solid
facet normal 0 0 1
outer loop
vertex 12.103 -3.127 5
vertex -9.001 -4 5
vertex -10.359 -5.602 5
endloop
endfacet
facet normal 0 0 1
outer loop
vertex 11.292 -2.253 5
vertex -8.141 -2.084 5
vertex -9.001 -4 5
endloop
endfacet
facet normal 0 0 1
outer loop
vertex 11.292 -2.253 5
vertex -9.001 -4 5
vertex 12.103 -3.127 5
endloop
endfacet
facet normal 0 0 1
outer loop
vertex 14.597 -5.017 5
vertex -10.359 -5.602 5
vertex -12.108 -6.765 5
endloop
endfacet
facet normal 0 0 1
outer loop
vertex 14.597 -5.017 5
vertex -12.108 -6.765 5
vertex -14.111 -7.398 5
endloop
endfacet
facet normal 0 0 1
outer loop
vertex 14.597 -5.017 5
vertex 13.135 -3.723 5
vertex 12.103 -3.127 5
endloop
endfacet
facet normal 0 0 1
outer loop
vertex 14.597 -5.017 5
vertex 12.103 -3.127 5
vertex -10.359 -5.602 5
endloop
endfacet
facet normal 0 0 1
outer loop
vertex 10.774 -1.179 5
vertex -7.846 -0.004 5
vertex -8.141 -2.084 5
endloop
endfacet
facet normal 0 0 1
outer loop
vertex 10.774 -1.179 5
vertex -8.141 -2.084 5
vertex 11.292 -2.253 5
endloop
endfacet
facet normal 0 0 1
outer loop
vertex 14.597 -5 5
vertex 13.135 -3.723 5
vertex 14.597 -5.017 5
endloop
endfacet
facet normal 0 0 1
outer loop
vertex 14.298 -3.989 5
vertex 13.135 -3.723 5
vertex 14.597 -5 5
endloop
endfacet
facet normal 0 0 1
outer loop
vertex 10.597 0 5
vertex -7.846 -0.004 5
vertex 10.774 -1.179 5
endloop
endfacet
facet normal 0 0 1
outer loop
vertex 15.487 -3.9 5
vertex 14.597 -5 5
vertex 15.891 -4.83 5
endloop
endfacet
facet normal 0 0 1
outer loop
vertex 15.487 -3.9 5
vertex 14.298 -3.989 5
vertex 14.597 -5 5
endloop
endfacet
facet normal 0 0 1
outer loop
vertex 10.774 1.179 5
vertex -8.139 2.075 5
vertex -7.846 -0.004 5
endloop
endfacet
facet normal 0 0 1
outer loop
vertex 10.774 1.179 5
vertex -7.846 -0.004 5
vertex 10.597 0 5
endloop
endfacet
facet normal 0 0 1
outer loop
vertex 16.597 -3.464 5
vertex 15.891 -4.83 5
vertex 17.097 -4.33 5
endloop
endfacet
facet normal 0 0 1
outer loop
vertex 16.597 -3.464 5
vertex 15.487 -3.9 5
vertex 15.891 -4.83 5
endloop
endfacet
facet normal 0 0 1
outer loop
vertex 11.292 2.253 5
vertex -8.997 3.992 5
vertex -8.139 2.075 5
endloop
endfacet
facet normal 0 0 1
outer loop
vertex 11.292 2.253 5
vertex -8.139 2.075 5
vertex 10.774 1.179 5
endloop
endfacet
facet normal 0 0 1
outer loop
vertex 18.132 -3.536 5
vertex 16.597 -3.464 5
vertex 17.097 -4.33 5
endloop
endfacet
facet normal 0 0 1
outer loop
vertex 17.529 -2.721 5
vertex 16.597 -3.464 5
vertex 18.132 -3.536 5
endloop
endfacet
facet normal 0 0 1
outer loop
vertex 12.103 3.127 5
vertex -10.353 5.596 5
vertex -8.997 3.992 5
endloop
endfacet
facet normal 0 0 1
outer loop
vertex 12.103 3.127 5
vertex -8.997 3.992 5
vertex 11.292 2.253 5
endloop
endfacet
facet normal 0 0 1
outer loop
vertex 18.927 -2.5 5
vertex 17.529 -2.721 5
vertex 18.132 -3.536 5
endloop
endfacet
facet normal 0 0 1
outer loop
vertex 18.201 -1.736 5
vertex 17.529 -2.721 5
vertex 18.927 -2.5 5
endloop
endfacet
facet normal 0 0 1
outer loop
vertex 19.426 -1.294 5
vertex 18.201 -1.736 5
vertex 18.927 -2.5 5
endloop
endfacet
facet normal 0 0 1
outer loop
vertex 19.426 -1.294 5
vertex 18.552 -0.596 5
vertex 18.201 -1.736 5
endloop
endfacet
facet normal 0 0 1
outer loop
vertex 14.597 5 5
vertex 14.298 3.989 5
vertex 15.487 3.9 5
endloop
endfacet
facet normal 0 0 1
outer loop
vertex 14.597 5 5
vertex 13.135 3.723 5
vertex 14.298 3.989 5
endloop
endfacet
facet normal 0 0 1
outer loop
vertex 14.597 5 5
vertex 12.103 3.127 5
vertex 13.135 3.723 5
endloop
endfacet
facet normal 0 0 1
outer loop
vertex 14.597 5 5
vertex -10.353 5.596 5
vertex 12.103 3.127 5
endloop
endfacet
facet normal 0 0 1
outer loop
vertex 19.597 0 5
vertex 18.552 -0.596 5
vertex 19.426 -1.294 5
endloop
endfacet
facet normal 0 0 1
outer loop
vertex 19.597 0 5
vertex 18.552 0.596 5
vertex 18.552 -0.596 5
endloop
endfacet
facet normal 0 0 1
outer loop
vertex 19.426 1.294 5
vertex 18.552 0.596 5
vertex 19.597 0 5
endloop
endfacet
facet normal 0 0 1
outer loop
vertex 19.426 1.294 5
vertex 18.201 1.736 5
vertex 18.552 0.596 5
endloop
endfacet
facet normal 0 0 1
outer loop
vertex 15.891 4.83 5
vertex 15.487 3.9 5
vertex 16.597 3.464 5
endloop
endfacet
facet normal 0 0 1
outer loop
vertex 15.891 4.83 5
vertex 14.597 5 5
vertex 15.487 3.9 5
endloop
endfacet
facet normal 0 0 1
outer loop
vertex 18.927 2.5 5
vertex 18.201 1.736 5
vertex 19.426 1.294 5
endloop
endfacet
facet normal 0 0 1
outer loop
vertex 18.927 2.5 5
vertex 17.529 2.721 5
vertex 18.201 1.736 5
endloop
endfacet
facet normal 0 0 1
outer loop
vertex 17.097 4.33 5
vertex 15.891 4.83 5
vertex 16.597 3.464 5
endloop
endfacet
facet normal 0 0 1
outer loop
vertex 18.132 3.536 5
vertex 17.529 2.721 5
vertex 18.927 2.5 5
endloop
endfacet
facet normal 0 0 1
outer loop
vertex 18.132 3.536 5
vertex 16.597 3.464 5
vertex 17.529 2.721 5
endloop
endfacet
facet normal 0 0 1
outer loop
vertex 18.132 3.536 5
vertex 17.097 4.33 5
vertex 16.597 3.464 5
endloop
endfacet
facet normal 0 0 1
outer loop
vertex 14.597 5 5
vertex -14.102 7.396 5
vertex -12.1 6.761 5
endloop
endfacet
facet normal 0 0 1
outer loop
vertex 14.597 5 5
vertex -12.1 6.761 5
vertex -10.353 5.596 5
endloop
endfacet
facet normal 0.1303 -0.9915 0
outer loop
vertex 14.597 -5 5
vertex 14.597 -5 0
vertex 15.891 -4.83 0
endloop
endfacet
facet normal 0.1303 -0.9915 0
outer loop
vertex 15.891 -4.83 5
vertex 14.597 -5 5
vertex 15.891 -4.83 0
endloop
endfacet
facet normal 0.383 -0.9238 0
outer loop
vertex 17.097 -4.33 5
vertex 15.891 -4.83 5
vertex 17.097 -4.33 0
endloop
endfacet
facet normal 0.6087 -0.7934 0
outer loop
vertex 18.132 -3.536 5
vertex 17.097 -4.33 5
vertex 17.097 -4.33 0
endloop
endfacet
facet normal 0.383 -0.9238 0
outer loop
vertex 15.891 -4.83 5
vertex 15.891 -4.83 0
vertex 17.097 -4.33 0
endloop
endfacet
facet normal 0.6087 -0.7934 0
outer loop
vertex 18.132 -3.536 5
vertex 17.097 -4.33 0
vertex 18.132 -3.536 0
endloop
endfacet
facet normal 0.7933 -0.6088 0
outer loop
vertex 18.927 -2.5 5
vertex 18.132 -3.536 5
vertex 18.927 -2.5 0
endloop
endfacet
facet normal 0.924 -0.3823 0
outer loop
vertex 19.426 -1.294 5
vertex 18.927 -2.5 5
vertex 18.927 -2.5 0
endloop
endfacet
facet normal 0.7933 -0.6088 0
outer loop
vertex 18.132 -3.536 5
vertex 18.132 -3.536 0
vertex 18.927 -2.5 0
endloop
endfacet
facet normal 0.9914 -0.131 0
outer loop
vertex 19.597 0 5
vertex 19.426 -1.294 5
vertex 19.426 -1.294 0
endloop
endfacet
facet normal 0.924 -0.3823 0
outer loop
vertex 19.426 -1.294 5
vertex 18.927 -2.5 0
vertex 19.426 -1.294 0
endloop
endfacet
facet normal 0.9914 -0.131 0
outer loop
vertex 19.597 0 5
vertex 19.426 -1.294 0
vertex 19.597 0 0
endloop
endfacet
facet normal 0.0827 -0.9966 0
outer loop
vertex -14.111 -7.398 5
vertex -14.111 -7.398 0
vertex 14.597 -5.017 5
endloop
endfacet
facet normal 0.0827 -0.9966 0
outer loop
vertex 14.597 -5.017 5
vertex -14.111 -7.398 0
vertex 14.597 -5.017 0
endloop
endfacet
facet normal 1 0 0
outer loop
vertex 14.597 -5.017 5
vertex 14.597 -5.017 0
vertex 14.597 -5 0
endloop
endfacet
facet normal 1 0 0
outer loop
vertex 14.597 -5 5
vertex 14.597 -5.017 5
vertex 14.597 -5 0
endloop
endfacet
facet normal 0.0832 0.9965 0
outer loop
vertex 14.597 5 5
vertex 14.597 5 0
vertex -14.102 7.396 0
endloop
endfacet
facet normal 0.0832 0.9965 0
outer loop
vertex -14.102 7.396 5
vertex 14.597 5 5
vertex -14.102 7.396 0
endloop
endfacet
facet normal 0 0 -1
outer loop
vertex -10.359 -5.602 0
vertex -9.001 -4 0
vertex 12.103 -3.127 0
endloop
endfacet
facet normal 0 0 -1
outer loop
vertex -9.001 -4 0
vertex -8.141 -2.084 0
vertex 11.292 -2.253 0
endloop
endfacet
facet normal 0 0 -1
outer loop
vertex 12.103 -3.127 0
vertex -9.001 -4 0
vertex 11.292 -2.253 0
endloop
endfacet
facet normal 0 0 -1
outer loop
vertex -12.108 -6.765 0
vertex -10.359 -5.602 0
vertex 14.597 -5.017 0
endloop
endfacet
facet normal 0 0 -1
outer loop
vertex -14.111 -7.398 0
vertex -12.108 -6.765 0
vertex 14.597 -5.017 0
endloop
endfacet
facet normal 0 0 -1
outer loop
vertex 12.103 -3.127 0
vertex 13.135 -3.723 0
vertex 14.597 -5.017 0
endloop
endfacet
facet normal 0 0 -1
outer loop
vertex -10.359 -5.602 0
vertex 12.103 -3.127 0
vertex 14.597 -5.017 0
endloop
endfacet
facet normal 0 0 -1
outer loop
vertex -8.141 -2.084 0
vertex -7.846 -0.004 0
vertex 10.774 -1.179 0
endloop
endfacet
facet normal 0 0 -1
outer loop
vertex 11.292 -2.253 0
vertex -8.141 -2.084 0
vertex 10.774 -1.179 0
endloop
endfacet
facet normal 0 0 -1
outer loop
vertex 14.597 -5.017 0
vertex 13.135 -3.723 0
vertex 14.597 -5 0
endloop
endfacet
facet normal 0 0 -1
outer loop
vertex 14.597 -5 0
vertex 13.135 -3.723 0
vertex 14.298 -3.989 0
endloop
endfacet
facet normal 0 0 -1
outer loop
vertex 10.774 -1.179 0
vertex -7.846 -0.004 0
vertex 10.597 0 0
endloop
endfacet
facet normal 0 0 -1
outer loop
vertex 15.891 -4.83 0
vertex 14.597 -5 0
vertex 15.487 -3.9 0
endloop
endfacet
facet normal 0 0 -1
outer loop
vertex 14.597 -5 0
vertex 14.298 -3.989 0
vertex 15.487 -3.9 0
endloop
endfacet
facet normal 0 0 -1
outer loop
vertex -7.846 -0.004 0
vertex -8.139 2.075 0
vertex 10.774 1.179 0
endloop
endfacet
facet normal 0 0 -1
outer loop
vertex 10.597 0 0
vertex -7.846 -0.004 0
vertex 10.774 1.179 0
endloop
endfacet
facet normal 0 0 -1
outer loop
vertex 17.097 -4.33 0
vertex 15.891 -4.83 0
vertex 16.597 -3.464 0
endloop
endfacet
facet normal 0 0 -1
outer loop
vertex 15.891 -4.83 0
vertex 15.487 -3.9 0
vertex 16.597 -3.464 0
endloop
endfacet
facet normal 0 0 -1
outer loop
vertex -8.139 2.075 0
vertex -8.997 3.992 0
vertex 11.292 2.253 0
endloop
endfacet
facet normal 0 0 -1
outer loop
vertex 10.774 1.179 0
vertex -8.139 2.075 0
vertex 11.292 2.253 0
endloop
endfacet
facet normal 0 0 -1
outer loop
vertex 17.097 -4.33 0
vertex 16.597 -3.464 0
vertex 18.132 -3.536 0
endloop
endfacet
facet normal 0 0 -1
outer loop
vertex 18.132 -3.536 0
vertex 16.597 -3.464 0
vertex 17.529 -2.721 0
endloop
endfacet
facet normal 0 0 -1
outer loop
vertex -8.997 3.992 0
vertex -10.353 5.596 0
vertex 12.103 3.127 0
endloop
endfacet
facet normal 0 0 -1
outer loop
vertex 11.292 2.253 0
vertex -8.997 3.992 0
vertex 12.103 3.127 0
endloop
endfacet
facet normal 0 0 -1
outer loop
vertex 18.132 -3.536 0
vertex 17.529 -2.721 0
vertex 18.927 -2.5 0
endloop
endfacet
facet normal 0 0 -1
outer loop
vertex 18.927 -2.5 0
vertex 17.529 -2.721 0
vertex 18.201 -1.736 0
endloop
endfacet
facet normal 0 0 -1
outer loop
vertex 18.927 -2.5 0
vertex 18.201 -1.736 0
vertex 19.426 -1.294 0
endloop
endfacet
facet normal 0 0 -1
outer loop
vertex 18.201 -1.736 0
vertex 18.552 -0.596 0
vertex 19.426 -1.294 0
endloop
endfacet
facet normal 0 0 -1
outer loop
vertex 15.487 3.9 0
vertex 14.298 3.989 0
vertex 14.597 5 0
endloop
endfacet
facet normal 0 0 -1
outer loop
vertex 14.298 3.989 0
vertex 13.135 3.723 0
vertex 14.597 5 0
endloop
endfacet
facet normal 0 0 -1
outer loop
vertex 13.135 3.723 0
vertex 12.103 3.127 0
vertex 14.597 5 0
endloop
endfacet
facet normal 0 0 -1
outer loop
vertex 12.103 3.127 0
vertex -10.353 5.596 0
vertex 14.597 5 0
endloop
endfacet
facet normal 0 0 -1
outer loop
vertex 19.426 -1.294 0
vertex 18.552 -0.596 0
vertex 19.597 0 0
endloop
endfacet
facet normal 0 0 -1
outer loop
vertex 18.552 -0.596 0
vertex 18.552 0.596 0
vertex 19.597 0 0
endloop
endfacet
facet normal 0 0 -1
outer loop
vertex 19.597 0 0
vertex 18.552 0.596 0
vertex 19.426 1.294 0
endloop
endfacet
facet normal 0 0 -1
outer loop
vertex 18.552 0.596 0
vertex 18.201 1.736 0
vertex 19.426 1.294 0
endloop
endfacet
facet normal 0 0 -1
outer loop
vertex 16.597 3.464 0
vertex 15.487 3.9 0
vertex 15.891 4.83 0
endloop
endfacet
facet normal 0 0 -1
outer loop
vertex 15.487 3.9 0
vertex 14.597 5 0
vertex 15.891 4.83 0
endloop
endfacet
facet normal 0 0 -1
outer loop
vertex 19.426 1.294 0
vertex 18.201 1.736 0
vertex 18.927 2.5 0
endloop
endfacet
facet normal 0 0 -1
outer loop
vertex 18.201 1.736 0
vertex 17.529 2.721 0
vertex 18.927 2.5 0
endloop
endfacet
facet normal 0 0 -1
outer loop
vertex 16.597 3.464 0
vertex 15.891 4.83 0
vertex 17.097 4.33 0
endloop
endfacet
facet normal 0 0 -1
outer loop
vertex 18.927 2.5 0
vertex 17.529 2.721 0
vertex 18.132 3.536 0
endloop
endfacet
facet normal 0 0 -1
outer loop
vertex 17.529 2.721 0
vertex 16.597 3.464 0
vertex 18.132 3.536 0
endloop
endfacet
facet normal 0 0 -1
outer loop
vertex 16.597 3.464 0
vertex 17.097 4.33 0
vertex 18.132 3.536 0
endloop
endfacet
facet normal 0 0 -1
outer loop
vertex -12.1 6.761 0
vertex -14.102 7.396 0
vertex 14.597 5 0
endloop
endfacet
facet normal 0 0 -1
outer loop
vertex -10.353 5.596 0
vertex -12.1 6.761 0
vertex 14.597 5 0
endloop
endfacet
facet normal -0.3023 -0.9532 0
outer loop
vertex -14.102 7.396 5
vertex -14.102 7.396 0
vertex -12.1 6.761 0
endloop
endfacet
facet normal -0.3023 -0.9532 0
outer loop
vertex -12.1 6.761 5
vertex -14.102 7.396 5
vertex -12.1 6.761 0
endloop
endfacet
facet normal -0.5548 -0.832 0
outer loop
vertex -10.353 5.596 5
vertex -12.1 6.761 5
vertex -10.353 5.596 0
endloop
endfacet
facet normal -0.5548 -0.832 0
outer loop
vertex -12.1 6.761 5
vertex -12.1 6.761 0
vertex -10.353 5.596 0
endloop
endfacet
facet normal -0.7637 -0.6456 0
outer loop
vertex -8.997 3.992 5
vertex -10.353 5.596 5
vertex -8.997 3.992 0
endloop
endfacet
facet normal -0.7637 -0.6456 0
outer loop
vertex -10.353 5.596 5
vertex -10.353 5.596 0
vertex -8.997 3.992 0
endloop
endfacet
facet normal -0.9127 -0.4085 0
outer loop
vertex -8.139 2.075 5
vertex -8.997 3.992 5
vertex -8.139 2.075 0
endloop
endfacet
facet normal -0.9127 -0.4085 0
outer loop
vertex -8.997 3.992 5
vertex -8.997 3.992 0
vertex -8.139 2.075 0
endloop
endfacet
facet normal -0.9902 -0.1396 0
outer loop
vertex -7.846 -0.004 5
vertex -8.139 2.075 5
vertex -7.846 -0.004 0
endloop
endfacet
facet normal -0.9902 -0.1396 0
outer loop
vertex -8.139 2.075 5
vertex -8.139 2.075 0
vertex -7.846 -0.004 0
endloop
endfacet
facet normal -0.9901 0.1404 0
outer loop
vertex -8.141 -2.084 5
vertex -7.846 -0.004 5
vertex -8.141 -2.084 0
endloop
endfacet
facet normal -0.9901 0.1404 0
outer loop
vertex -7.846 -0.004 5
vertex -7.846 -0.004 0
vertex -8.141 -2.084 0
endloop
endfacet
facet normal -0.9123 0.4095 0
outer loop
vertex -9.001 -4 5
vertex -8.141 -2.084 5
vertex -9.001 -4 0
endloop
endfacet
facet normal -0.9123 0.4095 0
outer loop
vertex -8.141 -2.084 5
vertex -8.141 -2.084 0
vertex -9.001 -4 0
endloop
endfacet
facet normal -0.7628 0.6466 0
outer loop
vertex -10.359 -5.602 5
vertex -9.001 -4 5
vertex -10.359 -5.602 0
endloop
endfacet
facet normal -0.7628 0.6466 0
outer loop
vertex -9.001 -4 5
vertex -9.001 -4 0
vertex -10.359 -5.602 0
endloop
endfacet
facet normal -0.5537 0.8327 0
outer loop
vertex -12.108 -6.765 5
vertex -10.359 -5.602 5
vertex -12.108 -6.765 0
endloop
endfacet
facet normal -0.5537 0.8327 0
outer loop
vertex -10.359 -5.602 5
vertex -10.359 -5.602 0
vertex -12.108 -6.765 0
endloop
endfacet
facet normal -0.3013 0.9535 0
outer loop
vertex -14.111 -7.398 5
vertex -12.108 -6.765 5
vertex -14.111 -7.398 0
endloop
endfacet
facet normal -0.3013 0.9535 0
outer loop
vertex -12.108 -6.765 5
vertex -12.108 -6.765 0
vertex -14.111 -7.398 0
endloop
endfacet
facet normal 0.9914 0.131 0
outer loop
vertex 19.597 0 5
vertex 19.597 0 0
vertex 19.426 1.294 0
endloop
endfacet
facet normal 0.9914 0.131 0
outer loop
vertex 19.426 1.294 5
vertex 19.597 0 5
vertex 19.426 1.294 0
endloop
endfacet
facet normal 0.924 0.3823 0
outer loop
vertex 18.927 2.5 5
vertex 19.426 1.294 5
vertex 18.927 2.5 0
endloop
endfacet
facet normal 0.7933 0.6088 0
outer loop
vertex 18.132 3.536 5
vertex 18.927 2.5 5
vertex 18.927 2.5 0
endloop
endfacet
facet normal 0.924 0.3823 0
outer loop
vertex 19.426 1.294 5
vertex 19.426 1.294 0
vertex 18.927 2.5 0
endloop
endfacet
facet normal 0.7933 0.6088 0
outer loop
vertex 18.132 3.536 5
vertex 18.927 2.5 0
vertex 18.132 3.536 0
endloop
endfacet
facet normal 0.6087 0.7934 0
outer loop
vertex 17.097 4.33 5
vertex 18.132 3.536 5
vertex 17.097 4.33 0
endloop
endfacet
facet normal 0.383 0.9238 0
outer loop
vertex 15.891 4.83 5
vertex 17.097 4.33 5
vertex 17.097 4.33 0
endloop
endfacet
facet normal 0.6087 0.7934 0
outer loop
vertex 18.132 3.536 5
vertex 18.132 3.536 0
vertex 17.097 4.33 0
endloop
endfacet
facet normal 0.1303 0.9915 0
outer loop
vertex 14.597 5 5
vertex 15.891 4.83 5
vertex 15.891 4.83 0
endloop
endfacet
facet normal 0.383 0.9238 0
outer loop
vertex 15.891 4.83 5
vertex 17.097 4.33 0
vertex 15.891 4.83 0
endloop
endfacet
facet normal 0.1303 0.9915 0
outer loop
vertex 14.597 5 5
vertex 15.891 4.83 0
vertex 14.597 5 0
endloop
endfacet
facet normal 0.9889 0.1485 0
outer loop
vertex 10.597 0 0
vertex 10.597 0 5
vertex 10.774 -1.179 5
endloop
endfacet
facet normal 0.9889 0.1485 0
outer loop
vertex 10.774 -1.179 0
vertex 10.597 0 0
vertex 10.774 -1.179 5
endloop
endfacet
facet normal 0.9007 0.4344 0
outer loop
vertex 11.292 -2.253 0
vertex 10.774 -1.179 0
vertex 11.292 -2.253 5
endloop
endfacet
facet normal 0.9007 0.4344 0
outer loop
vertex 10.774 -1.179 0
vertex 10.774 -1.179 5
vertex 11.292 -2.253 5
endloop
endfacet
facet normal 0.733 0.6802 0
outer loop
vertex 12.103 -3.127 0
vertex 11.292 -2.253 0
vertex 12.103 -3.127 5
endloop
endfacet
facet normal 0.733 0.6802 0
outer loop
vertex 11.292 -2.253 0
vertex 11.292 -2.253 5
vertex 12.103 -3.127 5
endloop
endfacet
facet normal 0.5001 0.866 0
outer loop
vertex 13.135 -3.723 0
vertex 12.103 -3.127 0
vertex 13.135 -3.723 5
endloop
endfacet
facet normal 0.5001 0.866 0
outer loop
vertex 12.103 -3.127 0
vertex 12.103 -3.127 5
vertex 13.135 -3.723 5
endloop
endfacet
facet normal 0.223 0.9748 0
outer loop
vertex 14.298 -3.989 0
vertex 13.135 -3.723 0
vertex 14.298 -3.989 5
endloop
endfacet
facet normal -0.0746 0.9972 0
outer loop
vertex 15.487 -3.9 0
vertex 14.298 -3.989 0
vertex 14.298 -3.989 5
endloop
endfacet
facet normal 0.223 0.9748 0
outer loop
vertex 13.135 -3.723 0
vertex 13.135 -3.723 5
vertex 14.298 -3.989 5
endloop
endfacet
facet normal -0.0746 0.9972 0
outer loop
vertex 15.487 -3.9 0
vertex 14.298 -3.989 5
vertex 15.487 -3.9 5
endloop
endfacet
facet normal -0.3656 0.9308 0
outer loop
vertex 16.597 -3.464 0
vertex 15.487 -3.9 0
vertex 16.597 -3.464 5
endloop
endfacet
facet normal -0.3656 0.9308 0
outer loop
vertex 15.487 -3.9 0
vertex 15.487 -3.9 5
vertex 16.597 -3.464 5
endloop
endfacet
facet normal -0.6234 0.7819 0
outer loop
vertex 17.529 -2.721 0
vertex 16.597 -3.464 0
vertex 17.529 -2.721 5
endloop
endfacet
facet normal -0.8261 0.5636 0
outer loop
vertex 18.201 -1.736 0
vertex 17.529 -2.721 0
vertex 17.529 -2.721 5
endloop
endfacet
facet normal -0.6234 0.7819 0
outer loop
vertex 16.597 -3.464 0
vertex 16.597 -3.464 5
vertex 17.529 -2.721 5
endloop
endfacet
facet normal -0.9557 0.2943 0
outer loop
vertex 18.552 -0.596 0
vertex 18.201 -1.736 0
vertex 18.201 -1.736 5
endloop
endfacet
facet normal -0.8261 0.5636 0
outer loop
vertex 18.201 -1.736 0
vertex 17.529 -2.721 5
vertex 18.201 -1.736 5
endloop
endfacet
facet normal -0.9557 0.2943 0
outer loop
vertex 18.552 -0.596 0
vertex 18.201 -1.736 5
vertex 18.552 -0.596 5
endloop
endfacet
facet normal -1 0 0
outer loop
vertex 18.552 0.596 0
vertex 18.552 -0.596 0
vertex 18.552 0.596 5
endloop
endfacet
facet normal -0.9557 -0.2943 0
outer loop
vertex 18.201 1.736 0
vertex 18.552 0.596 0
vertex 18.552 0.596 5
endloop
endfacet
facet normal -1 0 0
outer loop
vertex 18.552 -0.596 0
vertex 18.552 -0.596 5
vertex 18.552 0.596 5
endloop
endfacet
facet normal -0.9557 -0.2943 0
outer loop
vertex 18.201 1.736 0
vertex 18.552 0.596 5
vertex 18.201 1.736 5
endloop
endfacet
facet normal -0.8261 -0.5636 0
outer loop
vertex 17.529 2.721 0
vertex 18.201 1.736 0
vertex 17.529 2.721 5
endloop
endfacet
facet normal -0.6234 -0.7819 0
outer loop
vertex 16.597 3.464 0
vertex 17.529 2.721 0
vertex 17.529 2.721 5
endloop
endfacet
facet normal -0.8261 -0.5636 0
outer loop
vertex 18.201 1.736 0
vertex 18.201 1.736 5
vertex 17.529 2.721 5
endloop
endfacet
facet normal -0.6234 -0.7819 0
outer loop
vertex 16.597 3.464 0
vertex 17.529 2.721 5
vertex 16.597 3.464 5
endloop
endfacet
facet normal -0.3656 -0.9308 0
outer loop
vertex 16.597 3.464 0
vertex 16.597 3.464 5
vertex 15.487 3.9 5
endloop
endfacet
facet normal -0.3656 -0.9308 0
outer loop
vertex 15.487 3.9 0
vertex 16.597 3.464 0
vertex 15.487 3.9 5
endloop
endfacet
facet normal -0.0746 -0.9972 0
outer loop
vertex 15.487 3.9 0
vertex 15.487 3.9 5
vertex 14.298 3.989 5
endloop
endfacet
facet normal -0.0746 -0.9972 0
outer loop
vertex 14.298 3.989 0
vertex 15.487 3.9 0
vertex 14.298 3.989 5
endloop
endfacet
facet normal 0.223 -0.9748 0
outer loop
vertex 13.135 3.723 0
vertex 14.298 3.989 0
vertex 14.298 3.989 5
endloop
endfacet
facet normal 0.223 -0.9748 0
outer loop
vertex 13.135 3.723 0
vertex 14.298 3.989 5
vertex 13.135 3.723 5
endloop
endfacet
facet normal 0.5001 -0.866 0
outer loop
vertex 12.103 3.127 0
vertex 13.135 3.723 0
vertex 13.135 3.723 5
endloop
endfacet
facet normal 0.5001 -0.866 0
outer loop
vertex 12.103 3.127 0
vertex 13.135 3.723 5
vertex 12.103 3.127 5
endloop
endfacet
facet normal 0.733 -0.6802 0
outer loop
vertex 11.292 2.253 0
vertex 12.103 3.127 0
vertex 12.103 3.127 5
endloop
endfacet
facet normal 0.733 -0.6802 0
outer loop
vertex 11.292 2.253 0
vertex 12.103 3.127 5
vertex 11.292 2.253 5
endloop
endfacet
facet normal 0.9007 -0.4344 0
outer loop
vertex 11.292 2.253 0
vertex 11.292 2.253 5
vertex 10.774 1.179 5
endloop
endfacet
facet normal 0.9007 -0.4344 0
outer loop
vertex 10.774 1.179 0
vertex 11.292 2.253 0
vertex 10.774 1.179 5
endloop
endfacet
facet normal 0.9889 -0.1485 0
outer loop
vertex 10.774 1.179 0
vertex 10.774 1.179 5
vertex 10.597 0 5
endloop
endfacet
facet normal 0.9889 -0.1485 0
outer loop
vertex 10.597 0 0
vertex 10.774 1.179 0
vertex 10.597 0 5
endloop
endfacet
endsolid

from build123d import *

# Parameters (mm, degrees)
F1_DEPTH = 5
F3_D     = 8


with BuildPart() as f1:
    # F0 (on Top) → F1 (new body)
    with BuildSketch(Plane.XY):
        with BuildLine():
            ThreePointArc((14.5967810947, -5), (18.1323150007, -3.5355339059), (19.5967810947, 0))
            ThreePointArc((19.5967810947, 0), (18.1323150007, 3.5355339059), (14.5967810947, 5))
            Line((14.5967810947, 5), (14.5967810947, 0))
            Line((14.5967810947, 0), (14.5967810947, -5))
        make_face()
        with BuildLine():
            Line((14.5967810947, 0), (14.5967810947, 5))
            ThreePointArc((14.5967810947, 5), (9.5967810947, 0), (14.5967810947, -5))
            Line((14.5967810947, -5), (14.5967810947, 0))
        make_face()
        with BuildLine():
            ThreePointArc((14.5967810947, -5), (9.5967810947, 0), (14.5967810947, 5))
            Line((14.5967810947, 5), (-14.1023044895, 7.3961588722))
            ThreePointArc((-14.1023044895, 7.3961588722), (-9.6198593647, 4.8436616619), (-7.8460222776, 0))
            ThreePointArc((-7.8460222776, 0), (-9.6226170145, -4.8469198667), (-14.110724196, -7.39756978))
            Line((-14.110724196, -7.39756978), (14.5967810947, -5.0171596368))
            Line((14.5967810947, -5.0171596368), (14.5967810947, -5))
        make_face()
    extrude(amount=F1_DEPTH)

    # F3 (through all)
    with Locations(Plane(origin=(0, 0, 0), x_dir=(1, 0, 0), z_dir=(0, 0, -1))):
        with Locations((14.5967810947, 0)):
            Hole(F3_D / 2)


solid = f1.part
